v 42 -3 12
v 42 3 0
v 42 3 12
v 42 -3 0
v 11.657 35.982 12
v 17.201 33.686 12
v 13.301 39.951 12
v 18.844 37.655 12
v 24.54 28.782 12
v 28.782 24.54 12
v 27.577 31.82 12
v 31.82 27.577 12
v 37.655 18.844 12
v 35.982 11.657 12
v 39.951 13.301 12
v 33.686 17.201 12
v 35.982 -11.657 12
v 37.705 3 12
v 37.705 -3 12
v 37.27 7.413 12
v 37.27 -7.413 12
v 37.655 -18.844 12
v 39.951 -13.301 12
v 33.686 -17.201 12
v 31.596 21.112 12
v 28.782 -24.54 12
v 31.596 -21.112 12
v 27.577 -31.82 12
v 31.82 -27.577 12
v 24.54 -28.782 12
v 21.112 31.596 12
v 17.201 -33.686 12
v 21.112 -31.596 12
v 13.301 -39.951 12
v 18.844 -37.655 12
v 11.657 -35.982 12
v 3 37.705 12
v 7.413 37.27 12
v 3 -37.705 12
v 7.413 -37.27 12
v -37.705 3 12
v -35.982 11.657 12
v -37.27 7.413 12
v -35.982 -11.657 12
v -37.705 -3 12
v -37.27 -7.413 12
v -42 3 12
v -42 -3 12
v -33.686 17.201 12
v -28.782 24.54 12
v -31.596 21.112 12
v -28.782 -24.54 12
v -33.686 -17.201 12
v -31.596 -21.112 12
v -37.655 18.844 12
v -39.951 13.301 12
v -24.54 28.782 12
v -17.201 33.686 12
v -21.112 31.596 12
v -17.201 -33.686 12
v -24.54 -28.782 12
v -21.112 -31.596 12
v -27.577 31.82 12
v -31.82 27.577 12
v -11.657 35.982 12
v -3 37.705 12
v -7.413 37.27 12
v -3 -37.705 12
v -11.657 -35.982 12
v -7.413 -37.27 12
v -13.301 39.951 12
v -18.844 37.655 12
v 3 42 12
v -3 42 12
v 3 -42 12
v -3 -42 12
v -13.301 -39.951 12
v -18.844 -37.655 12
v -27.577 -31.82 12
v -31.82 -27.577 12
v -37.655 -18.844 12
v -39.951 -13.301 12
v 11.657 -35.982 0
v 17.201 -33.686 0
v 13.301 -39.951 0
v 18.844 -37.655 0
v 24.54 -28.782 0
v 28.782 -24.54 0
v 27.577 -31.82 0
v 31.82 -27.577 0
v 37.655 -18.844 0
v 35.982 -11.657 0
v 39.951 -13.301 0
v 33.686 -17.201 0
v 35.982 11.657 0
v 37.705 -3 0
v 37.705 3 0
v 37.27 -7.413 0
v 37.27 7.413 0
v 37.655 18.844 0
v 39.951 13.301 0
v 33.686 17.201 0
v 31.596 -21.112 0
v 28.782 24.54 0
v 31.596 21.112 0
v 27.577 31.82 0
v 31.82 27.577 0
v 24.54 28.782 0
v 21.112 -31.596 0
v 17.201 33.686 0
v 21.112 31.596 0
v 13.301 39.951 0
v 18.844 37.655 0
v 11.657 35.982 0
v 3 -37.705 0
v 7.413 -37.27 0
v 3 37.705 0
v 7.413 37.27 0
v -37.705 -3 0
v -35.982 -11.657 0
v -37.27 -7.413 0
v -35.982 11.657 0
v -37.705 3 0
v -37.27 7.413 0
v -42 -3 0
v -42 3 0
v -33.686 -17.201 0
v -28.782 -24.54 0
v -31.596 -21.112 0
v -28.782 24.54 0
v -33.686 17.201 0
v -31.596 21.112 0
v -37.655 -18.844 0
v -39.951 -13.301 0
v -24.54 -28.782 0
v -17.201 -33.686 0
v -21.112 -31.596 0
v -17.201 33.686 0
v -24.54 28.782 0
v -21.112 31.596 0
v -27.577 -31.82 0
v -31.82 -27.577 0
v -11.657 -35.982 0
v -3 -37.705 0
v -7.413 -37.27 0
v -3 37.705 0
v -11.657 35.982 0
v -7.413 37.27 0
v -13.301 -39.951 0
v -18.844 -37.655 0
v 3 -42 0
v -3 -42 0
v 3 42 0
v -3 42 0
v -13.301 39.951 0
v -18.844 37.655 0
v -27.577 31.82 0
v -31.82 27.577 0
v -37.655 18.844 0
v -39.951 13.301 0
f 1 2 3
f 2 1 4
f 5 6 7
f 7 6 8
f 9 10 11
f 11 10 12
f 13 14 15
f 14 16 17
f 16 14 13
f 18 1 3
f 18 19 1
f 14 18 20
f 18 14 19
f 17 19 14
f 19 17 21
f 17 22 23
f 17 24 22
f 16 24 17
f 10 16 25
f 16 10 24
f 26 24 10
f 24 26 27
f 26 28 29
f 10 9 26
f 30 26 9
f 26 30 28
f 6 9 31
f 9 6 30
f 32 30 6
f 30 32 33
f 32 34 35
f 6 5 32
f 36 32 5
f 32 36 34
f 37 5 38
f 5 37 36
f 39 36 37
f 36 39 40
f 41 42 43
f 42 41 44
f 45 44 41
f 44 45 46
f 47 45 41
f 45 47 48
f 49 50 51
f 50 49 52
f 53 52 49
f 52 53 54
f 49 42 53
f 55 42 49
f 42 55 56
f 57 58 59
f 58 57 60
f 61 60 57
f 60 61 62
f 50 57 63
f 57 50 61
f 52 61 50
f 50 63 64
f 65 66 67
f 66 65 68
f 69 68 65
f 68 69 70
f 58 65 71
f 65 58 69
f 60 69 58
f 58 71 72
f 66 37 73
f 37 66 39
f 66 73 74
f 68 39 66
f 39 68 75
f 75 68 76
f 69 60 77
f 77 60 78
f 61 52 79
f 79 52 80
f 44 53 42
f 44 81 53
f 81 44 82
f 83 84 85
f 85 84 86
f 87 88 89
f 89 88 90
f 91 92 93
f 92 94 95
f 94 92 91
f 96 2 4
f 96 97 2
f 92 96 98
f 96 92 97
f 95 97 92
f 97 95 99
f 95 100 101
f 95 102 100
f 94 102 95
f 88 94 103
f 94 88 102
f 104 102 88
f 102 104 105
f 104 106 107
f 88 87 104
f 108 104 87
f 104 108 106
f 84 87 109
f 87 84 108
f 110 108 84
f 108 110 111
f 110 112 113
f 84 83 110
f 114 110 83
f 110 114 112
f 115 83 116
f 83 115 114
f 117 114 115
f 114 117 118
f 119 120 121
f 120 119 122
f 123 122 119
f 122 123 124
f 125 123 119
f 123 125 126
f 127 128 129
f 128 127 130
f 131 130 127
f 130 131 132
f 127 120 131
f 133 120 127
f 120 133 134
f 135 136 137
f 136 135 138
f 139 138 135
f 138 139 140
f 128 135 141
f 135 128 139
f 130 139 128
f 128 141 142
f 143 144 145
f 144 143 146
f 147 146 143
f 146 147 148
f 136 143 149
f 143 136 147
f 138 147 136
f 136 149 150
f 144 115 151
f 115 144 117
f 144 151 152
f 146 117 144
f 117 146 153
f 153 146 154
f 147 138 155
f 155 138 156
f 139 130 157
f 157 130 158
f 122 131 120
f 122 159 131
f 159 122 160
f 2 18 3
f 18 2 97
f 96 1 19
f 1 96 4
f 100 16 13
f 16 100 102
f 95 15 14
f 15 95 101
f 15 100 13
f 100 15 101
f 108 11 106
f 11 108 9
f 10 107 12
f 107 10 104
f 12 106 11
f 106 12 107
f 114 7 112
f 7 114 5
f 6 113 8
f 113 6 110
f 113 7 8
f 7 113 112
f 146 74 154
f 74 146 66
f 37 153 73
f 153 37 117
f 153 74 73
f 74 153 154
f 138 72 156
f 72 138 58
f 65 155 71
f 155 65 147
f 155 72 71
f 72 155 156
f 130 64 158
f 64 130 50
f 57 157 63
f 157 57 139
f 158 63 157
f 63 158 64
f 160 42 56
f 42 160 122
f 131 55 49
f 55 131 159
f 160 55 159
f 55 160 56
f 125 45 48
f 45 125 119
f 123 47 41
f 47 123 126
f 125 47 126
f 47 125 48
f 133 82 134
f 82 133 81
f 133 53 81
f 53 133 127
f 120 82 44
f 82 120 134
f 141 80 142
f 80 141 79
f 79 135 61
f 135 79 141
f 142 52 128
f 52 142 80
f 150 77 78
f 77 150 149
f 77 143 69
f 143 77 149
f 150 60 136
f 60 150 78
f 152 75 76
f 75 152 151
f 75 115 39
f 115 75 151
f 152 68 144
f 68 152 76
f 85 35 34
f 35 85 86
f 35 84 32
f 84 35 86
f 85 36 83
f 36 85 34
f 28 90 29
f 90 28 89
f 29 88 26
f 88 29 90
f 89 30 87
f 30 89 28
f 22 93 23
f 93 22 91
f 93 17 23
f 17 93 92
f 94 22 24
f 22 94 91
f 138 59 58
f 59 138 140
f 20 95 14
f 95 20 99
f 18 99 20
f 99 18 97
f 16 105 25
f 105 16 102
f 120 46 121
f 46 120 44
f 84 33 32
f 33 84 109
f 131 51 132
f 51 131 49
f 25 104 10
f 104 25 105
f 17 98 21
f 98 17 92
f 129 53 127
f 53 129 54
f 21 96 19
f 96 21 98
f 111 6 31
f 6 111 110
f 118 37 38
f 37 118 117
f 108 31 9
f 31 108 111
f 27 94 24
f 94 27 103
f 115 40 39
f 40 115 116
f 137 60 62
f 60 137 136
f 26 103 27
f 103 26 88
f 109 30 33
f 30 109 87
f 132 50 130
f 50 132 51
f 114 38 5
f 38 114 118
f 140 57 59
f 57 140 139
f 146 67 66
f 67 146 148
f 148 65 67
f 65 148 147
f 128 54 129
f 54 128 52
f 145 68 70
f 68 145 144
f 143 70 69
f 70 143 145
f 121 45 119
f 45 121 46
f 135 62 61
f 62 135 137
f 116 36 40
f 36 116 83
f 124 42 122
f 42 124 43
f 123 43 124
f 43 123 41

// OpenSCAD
$fn = 32;

// ----------------------------------------------------------------------
// Spur blank: plain gear blank
// ----------------------------------------------------------------------

// --- parameters (mm) ---
disc_r = 38;              // blank root radius
disc_t = 12;              // blank thickness
n_teeth = 16;             // stub tooth count
tooth_w = 6;              // tooth width at the root
tooth_h = 4;              // tooth height above the root

out_r = disc_r + tooth_h;  // tip radius
bbox_x = 84.0;  // measured width over the teeth
bbox_y = 84.0;  // measured depth over the teeth

union() {
  cylinder(r = disc_r, h = disc_t);
  for (i = [0 : n_teeth - 1])
    rotate([0, 0, i * 360 / n_teeth])
      translate([disc_r - 1, -tooth_w / 2, 0])
        cube([tooth_h + 1, tooth_w, disc_t]);
}
